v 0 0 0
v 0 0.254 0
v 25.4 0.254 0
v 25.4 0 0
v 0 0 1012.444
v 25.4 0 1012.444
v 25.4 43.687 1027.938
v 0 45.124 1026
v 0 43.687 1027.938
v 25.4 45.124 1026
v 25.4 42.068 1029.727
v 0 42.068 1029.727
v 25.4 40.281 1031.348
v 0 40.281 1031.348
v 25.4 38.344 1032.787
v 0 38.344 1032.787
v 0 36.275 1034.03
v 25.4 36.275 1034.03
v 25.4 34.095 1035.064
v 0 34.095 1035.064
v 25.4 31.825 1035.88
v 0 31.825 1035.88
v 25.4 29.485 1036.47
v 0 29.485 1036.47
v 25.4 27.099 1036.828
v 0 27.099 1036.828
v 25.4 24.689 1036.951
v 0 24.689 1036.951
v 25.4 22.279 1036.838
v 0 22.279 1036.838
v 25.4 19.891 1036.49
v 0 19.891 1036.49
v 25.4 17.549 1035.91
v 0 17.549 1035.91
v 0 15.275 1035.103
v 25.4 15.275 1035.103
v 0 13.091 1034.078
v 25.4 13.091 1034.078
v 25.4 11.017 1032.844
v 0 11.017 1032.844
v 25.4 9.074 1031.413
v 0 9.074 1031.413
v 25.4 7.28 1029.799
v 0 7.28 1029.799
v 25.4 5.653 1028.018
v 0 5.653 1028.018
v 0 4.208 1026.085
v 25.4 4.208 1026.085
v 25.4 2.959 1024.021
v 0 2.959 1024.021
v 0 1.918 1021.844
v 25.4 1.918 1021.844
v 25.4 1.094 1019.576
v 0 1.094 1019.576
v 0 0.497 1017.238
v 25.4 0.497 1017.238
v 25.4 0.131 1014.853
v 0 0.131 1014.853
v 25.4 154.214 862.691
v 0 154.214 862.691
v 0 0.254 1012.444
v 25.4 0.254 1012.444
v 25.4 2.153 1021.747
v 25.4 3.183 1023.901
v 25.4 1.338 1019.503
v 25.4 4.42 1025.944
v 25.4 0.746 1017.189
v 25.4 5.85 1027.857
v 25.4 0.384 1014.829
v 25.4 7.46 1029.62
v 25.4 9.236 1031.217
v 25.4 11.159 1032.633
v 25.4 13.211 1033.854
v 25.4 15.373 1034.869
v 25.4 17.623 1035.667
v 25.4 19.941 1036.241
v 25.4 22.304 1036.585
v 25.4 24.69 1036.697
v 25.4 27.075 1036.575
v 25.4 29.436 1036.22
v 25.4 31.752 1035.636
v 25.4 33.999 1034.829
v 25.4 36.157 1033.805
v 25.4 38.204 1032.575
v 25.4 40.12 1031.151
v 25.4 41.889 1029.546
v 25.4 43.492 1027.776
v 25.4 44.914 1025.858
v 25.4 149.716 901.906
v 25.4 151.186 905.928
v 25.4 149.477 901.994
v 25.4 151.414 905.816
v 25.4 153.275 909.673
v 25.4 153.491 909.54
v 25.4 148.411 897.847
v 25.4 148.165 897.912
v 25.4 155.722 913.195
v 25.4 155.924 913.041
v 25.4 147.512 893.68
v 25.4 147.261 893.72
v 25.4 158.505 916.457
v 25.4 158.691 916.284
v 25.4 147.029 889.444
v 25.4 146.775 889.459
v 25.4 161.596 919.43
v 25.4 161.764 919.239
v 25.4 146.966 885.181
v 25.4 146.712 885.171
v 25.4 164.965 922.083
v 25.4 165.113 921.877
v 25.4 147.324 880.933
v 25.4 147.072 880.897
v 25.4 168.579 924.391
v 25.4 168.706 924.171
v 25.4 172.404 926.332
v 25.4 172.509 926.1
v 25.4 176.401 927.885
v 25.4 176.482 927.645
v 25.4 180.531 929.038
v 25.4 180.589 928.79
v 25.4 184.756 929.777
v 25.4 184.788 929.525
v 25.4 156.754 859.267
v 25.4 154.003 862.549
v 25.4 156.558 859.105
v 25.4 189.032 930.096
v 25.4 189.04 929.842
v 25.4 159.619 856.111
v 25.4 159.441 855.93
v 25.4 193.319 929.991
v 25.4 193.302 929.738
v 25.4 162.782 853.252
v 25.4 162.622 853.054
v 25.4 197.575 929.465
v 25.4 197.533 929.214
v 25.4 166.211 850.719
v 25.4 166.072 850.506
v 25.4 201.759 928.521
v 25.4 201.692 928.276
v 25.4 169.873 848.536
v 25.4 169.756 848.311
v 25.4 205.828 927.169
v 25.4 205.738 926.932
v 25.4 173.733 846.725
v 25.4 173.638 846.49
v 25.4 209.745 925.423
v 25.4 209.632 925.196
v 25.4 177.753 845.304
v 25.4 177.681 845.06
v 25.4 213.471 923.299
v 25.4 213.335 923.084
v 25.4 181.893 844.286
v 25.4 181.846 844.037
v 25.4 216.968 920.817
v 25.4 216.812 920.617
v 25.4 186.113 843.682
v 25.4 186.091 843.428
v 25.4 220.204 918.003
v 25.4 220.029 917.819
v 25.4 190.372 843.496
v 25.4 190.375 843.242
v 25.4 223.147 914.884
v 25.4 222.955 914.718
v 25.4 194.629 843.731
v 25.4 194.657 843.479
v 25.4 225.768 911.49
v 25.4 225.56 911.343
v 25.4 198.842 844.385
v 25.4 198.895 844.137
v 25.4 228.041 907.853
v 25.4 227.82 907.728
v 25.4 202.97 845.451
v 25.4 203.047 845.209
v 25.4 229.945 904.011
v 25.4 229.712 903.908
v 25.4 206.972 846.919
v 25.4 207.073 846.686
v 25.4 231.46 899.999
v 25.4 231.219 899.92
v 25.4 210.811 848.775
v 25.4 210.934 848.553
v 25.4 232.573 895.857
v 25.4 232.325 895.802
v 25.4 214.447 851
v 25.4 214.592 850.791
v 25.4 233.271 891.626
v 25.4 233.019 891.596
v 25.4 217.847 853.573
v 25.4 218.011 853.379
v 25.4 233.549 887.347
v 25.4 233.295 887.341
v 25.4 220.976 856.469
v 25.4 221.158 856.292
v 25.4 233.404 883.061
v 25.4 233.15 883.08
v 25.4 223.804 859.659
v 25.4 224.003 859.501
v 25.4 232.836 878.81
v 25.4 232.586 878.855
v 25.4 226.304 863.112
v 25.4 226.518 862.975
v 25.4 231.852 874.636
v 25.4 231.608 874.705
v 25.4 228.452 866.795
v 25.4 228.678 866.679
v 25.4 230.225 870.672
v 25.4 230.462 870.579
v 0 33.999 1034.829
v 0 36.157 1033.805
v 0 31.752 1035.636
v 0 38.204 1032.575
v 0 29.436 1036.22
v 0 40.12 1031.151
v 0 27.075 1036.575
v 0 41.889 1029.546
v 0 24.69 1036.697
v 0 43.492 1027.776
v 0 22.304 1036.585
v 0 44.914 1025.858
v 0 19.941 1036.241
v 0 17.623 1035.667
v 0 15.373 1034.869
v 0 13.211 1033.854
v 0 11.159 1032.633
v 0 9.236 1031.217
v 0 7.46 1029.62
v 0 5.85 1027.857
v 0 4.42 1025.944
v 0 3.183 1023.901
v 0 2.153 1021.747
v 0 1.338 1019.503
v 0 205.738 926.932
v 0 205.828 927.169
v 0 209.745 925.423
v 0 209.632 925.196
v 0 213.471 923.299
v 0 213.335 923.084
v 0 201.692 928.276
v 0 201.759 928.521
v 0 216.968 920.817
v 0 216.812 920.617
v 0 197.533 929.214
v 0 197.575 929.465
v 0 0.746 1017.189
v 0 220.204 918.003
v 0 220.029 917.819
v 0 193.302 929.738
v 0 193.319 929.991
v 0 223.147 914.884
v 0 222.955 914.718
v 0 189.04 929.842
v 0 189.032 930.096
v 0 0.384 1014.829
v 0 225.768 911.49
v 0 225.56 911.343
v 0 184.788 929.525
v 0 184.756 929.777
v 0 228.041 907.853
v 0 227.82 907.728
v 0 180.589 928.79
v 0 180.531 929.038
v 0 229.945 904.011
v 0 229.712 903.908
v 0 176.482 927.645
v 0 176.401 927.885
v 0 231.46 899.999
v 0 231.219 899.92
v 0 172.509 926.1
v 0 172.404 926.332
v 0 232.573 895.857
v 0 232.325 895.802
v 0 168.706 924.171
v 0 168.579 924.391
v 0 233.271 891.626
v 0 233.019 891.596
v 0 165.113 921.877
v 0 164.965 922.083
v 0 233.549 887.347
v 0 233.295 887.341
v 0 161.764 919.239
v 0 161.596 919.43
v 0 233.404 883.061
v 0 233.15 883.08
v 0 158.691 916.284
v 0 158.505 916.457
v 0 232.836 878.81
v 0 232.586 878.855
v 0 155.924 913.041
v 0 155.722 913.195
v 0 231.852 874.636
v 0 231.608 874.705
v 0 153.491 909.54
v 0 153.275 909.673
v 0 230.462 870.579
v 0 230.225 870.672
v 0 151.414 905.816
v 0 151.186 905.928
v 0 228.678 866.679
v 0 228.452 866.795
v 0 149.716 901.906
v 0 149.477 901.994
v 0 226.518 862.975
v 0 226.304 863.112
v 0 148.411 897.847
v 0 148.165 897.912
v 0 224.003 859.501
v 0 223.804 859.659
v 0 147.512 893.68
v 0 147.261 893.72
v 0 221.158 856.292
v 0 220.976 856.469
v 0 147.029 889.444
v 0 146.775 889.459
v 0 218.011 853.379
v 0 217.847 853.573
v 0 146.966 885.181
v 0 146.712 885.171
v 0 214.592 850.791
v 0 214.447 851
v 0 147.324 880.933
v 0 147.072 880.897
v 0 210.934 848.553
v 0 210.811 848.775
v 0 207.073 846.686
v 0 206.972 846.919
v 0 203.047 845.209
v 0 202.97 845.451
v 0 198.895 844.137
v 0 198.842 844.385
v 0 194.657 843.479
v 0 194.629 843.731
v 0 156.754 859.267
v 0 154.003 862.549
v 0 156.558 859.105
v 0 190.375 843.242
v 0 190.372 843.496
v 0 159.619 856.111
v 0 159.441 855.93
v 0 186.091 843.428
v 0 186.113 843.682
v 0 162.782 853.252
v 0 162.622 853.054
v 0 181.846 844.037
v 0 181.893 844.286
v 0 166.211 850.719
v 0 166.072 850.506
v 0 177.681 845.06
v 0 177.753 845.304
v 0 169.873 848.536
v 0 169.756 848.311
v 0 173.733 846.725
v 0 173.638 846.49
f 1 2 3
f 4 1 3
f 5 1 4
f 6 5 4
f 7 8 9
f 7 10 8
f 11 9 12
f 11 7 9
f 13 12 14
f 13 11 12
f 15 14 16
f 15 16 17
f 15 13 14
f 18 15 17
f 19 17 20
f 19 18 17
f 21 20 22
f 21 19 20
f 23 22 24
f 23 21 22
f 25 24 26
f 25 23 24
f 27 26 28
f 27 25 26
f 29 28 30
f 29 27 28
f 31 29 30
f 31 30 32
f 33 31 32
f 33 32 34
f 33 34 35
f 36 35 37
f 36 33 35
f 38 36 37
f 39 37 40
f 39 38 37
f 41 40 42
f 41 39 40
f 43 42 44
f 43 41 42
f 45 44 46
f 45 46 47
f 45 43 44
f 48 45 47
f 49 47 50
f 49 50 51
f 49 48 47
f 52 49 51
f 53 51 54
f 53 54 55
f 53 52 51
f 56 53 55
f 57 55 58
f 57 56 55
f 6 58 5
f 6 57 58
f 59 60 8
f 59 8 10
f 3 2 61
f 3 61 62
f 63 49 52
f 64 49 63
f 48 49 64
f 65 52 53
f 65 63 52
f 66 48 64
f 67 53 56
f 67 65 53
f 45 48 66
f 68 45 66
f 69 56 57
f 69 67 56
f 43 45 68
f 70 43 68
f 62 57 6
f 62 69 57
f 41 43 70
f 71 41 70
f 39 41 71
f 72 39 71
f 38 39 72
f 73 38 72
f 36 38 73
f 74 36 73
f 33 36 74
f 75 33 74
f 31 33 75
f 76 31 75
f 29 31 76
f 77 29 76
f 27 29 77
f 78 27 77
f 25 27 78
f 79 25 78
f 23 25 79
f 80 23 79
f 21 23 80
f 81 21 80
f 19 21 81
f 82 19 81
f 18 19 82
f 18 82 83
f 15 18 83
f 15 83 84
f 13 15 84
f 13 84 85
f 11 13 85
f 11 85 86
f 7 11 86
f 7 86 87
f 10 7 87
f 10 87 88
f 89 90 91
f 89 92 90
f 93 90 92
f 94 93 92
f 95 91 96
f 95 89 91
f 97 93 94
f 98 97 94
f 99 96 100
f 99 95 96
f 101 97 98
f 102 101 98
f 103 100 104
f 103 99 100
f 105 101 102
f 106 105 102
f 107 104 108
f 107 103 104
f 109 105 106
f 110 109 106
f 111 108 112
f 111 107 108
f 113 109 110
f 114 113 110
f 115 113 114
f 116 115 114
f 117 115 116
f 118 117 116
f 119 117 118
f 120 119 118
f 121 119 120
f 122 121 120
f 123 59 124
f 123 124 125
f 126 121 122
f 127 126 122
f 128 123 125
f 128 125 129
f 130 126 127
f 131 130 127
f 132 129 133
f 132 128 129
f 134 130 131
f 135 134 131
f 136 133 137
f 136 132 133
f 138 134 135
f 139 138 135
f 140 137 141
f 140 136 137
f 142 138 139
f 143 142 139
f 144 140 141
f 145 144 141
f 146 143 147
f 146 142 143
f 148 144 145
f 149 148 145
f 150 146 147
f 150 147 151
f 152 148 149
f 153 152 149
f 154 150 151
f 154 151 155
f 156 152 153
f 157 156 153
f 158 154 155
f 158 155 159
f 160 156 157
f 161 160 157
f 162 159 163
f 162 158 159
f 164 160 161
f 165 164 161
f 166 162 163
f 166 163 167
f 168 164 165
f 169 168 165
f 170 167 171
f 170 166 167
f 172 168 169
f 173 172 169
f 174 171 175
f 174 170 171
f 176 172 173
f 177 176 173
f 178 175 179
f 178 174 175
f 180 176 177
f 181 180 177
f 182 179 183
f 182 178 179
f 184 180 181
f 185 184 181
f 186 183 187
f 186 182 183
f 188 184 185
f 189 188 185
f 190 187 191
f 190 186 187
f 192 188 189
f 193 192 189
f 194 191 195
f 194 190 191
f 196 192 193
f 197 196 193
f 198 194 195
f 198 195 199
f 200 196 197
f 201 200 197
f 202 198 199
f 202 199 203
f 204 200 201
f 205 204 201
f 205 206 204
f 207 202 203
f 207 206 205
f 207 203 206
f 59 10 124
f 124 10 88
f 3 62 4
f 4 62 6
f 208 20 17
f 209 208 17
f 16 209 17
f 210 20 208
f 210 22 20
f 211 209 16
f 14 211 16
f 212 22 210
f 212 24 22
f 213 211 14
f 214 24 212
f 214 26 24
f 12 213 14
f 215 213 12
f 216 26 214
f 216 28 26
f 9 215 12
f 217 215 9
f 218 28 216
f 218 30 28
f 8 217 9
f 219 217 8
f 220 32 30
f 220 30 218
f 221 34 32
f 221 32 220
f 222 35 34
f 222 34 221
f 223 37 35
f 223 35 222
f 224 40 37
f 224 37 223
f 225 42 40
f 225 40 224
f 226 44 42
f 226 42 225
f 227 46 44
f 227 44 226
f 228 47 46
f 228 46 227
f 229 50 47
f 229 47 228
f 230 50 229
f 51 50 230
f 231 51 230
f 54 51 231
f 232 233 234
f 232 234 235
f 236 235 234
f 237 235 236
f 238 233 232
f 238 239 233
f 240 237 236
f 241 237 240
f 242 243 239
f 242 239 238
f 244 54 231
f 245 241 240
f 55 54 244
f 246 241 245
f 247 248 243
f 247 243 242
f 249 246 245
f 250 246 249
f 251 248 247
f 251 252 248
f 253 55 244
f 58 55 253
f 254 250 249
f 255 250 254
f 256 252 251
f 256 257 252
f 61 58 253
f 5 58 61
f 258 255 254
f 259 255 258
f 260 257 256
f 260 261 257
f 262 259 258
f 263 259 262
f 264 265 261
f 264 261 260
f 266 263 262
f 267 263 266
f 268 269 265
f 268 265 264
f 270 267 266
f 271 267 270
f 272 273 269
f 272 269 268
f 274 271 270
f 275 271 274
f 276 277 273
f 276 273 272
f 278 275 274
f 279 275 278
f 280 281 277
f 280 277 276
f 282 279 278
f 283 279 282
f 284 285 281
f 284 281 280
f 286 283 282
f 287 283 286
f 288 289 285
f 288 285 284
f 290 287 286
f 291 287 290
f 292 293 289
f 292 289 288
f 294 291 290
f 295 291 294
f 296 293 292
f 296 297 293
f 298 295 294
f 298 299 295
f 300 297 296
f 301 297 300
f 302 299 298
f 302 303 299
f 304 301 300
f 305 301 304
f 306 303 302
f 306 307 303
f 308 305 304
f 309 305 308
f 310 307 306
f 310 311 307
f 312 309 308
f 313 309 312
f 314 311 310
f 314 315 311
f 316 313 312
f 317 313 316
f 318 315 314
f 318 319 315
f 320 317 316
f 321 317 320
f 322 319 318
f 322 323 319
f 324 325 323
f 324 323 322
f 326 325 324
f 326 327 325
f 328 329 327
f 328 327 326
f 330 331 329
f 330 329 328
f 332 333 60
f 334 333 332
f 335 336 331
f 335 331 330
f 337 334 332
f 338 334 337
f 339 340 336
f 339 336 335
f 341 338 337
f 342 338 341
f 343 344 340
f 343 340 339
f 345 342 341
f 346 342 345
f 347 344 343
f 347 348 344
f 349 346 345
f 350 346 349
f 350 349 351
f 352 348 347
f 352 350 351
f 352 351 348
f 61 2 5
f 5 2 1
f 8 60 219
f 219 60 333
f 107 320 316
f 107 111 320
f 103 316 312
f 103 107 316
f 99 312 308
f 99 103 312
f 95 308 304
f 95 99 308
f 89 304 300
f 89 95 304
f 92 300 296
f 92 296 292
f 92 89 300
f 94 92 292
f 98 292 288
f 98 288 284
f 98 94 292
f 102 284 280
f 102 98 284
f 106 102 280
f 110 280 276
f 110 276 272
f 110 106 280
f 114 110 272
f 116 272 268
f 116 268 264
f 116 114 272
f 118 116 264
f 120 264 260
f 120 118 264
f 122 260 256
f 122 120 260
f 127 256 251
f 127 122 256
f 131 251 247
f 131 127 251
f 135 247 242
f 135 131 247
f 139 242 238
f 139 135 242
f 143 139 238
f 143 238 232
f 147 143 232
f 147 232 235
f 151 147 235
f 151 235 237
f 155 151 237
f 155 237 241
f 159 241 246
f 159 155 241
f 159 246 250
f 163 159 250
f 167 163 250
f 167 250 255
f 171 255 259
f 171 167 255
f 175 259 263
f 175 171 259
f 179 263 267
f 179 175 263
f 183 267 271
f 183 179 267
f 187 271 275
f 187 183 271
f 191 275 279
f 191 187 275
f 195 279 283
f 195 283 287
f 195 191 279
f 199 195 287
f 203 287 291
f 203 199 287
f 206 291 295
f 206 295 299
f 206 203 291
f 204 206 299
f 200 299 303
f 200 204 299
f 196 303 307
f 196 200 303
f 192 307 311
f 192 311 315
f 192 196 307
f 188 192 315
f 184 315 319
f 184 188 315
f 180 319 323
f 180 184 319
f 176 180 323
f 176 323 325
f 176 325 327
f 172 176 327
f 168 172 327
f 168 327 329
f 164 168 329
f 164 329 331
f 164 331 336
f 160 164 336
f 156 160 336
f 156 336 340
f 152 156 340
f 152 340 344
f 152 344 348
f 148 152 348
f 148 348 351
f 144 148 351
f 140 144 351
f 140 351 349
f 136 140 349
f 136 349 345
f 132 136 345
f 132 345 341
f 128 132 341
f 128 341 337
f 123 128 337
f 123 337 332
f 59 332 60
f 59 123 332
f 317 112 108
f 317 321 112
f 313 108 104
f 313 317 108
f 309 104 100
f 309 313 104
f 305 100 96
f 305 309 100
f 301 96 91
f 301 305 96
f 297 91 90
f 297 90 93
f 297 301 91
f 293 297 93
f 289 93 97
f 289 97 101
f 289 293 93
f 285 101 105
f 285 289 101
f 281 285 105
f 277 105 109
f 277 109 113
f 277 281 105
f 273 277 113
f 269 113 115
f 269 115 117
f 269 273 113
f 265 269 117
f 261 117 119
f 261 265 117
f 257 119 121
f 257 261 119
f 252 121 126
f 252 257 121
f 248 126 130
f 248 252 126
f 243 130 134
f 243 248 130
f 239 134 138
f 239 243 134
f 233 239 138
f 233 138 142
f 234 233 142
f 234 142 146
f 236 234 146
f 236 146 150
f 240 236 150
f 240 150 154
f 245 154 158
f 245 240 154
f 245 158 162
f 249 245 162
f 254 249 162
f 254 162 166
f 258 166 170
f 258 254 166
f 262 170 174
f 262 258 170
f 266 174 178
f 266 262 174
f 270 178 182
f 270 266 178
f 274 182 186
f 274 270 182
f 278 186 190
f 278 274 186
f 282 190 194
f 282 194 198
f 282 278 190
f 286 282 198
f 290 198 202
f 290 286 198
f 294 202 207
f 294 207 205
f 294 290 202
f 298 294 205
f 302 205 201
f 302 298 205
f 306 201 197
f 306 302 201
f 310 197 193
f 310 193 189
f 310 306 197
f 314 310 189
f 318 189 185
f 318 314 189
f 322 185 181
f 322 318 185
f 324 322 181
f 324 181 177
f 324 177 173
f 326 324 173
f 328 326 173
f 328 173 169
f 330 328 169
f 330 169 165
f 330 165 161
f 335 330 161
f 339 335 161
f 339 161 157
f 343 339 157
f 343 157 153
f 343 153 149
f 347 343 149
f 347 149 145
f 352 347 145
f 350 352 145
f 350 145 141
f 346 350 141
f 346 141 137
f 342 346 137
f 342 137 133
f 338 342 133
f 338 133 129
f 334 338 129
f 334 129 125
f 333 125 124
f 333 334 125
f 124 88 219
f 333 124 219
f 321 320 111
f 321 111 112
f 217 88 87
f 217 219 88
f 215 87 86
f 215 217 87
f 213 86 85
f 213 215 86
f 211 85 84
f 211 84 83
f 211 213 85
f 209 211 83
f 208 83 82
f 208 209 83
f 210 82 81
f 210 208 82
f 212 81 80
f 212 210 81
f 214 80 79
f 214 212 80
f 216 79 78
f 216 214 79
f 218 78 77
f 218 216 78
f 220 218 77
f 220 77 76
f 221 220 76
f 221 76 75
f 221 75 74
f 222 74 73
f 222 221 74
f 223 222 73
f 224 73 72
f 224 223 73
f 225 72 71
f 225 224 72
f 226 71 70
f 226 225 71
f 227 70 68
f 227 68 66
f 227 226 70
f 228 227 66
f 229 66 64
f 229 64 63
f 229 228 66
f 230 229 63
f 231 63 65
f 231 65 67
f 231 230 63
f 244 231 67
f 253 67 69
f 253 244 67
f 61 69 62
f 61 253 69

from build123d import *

# Parameters (mm, degrees)
SKETCH1_W           = 25.4
SKETCH1_H           = 0.254
BOSS_EXTRUDE1_DEPTH = 1012.444
SKETCH3_W           = 25.4
SKETCH3_H           = 0.254


with BuildPart() as part:
    # Sketch1 → Boss-Extrude1 (new body)
    with BuildSketch(Plane.XY):
        with Locations((12.7, 0.127)):
            Rectangle(SKETCH1_W, SKETCH1_H)
    extrude(amount=BOSS_EXTRUDE1_DEPTH)

    # Sweep12: sweep along a path in Sketch5
    with BuildLine(Plane(origin=(0, 0, 0), x_dir=(0, 0, -1), z_dir=(1, 0, 0))) as sweep12_path:
        ThreePointArc((-880.897498734, 147.072202414), (-902.023368964, 230.752034475), (-862.54915142, 154.003074639))
        Line((-862.54915142, 154.003074639), (-1025.857747632, 44.913935374))
        ThreePointArc((-1025.857747632, 44.913935374), (-1035.666679092, 17.623395262), (-1012.444, 0.254))
    # Sketch3 → Sweep12 (sweep)
    with BuildSketch(Plane.XY.offset(1012.444)):
        with Locations((12.7, 0.127)):
            Rectangle(SKETCH3_W, SKETCH3_H)
    sweep(path=sweep12_path.line)


solid = part.part
